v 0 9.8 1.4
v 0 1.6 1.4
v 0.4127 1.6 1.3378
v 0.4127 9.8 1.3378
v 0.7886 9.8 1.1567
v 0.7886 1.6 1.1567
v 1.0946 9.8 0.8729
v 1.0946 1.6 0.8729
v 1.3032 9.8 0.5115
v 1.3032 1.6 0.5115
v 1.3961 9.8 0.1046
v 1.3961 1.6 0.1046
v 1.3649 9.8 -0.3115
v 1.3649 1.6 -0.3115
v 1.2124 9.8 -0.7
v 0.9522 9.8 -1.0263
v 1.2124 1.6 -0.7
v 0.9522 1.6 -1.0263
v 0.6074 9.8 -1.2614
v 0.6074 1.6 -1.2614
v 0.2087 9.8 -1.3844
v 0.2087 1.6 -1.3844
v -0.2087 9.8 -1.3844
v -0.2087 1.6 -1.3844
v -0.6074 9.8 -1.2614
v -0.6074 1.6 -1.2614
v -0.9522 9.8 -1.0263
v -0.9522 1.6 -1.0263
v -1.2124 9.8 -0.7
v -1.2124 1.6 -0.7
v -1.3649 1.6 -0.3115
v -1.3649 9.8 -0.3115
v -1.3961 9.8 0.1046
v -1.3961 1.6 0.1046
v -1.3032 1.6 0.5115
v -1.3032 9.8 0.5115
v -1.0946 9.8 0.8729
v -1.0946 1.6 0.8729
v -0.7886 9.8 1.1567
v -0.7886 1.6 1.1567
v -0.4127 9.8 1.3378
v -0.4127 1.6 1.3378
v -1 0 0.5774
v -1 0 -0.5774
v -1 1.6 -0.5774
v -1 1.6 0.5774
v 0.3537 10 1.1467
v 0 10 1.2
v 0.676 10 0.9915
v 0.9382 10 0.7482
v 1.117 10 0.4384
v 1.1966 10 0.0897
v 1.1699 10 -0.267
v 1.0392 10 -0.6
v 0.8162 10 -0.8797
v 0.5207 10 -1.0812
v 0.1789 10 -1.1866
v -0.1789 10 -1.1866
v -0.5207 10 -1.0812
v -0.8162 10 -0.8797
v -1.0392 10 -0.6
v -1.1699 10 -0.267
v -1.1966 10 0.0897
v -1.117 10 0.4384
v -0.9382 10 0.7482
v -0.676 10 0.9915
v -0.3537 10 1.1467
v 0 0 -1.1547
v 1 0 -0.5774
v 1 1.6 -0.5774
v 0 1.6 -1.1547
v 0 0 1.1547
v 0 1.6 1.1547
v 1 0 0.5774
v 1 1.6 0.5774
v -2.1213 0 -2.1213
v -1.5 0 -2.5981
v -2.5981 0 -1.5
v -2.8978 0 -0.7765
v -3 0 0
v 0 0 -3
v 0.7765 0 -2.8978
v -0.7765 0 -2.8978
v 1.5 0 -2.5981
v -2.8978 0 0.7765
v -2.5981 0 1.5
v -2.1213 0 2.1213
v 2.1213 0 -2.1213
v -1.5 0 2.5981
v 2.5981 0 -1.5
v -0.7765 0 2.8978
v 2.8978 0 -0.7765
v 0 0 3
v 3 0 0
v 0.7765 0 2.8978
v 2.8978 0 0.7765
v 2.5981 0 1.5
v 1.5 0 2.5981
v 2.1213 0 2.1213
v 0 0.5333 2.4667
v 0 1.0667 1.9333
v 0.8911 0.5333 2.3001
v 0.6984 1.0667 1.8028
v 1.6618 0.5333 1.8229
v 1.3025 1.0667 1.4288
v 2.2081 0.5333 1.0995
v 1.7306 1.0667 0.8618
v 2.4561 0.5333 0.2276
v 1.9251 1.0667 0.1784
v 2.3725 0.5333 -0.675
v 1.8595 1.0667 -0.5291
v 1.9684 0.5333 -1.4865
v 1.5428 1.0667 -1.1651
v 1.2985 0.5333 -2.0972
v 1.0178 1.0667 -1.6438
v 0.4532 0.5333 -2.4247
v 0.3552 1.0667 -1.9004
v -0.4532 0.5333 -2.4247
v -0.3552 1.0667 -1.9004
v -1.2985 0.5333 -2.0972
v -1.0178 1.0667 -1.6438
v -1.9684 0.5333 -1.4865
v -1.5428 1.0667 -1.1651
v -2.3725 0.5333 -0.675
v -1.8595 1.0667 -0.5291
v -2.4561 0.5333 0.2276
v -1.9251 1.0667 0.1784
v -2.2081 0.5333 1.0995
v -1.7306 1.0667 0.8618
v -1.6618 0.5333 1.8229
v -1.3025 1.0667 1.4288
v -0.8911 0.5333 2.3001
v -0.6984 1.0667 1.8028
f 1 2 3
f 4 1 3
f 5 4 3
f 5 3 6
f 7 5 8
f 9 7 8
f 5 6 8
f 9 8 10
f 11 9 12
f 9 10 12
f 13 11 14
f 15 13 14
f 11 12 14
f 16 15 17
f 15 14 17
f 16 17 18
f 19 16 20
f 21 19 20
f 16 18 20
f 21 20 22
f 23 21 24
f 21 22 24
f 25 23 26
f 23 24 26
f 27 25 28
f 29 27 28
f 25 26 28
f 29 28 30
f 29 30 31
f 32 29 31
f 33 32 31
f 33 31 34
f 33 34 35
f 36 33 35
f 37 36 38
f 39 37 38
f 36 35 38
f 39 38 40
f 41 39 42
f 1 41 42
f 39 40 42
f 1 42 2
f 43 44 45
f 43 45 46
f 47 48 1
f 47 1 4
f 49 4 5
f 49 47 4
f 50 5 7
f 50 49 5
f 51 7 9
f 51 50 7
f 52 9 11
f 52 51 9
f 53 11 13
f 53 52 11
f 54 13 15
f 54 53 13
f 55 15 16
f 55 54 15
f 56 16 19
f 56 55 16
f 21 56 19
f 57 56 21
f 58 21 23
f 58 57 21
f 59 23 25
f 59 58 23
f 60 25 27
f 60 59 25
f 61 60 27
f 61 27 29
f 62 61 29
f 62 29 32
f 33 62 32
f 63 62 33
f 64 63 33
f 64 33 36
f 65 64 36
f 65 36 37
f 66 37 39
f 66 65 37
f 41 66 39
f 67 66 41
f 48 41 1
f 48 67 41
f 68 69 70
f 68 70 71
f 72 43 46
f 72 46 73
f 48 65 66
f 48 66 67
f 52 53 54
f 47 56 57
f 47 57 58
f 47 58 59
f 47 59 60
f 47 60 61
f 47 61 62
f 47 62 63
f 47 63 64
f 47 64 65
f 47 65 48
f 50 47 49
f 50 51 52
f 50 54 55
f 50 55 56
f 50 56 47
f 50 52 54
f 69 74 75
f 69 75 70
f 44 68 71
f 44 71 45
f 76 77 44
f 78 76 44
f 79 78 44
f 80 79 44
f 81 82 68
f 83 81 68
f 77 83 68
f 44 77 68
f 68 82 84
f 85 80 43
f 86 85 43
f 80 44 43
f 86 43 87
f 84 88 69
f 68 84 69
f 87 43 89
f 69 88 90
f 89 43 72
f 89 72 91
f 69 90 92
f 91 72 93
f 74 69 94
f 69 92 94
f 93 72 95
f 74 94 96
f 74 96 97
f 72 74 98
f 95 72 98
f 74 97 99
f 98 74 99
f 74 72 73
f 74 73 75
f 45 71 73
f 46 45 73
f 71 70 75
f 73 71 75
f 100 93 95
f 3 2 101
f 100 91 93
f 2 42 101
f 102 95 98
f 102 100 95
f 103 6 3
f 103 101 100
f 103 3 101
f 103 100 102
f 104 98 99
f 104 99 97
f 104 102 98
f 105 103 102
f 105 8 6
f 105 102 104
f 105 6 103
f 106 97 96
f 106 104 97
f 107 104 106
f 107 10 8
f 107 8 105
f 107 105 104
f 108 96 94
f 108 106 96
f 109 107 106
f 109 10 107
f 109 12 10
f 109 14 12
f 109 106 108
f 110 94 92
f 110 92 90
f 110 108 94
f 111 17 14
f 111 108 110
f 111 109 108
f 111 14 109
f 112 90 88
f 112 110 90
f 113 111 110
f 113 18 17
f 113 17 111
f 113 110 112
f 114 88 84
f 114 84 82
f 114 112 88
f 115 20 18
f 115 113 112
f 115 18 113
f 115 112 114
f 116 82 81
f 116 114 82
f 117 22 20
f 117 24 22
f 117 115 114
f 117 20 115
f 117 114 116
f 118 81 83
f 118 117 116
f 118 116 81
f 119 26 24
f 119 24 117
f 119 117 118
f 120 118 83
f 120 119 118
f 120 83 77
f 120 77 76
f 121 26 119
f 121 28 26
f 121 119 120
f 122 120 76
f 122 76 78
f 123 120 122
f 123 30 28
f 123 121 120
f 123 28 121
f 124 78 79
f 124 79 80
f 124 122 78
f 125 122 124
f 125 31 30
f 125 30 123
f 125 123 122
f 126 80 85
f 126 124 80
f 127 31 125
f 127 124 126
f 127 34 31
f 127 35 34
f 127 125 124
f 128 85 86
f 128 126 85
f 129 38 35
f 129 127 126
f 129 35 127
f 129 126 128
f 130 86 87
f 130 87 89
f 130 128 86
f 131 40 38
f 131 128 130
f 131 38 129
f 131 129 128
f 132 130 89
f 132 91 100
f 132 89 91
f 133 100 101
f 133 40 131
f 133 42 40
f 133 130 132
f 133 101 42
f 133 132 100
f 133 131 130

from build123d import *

# Parameters (mm, degrees)
SKETCH_1_R      = 3
EXTRUDE_1_DEPTH = 1.6
CHAMFER_1_SIZE  = 1.6
SKETCH_2_R      = 1.4
EXTRUDE_2_DEPTH = 8.4
CHAMFER_2_SIZE  = 0.2


with BuildPart() as part:
    # 草图1 → 凸台-拉伸1 (new body)
    with BuildSketch(Plane(origin=(0, 0, 0), x_dir=(1, 0, 0), z_dir=(0, 1, 0))):
        with Locations(Location((0, 0, 0), (0, 0, 270))):
            Circle(SKETCH_1_R)
        Polygon((0, -1.154700538), (1, -0.577350269), (1, 0.577350269), (0, 1.154700538), (-1, 0.577350269), (-1, -0.577350269), align=None, mode=Mode.SUBTRACT)
    extrude(amount=EXTRUDE_1_DEPTH)

    # 倒角1
    # the kernel refuses this chamfer: 1.6 mm, written as the material it takes off along each edge
    with BuildSketch(Plane(origin=(0, 1.6, 0), x_dir=(0, 0, 1), z_dir=(-1, 0, 0))) as chamfer_1_piece_1:
        Polygon((3, -CHAMFER_1_SIZE), (3 - CHAMFER_1_SIZE, 0), (3, 0), align=None)
    revolve(axis=Axis((0, 1.6, 0), (0, 1, 0)), mode=Mode.SUBTRACT)

    # 草图2 → 凸台-拉伸2 (add)
    with BuildSketch(Plane(origin=(0, 1.6, 0), x_dir=(1, 0, 0), z_dir=(0, 1, 0))):
        with Locations(Location((0, 0, 0), (0, 0, 270))):
            Circle(SKETCH_2_R)
    extrude(amount=EXTRUDE_2_DEPTH)

    # 倒角2
    chamfer_2_edges = [part.edges().sort_by_distance(p)[0] for p in [
        (0, 10, -1.4),
    ]]
    chamfer(chamfer_2_edges, length=CHAMFER_2_SIZE)


solid = part.part
